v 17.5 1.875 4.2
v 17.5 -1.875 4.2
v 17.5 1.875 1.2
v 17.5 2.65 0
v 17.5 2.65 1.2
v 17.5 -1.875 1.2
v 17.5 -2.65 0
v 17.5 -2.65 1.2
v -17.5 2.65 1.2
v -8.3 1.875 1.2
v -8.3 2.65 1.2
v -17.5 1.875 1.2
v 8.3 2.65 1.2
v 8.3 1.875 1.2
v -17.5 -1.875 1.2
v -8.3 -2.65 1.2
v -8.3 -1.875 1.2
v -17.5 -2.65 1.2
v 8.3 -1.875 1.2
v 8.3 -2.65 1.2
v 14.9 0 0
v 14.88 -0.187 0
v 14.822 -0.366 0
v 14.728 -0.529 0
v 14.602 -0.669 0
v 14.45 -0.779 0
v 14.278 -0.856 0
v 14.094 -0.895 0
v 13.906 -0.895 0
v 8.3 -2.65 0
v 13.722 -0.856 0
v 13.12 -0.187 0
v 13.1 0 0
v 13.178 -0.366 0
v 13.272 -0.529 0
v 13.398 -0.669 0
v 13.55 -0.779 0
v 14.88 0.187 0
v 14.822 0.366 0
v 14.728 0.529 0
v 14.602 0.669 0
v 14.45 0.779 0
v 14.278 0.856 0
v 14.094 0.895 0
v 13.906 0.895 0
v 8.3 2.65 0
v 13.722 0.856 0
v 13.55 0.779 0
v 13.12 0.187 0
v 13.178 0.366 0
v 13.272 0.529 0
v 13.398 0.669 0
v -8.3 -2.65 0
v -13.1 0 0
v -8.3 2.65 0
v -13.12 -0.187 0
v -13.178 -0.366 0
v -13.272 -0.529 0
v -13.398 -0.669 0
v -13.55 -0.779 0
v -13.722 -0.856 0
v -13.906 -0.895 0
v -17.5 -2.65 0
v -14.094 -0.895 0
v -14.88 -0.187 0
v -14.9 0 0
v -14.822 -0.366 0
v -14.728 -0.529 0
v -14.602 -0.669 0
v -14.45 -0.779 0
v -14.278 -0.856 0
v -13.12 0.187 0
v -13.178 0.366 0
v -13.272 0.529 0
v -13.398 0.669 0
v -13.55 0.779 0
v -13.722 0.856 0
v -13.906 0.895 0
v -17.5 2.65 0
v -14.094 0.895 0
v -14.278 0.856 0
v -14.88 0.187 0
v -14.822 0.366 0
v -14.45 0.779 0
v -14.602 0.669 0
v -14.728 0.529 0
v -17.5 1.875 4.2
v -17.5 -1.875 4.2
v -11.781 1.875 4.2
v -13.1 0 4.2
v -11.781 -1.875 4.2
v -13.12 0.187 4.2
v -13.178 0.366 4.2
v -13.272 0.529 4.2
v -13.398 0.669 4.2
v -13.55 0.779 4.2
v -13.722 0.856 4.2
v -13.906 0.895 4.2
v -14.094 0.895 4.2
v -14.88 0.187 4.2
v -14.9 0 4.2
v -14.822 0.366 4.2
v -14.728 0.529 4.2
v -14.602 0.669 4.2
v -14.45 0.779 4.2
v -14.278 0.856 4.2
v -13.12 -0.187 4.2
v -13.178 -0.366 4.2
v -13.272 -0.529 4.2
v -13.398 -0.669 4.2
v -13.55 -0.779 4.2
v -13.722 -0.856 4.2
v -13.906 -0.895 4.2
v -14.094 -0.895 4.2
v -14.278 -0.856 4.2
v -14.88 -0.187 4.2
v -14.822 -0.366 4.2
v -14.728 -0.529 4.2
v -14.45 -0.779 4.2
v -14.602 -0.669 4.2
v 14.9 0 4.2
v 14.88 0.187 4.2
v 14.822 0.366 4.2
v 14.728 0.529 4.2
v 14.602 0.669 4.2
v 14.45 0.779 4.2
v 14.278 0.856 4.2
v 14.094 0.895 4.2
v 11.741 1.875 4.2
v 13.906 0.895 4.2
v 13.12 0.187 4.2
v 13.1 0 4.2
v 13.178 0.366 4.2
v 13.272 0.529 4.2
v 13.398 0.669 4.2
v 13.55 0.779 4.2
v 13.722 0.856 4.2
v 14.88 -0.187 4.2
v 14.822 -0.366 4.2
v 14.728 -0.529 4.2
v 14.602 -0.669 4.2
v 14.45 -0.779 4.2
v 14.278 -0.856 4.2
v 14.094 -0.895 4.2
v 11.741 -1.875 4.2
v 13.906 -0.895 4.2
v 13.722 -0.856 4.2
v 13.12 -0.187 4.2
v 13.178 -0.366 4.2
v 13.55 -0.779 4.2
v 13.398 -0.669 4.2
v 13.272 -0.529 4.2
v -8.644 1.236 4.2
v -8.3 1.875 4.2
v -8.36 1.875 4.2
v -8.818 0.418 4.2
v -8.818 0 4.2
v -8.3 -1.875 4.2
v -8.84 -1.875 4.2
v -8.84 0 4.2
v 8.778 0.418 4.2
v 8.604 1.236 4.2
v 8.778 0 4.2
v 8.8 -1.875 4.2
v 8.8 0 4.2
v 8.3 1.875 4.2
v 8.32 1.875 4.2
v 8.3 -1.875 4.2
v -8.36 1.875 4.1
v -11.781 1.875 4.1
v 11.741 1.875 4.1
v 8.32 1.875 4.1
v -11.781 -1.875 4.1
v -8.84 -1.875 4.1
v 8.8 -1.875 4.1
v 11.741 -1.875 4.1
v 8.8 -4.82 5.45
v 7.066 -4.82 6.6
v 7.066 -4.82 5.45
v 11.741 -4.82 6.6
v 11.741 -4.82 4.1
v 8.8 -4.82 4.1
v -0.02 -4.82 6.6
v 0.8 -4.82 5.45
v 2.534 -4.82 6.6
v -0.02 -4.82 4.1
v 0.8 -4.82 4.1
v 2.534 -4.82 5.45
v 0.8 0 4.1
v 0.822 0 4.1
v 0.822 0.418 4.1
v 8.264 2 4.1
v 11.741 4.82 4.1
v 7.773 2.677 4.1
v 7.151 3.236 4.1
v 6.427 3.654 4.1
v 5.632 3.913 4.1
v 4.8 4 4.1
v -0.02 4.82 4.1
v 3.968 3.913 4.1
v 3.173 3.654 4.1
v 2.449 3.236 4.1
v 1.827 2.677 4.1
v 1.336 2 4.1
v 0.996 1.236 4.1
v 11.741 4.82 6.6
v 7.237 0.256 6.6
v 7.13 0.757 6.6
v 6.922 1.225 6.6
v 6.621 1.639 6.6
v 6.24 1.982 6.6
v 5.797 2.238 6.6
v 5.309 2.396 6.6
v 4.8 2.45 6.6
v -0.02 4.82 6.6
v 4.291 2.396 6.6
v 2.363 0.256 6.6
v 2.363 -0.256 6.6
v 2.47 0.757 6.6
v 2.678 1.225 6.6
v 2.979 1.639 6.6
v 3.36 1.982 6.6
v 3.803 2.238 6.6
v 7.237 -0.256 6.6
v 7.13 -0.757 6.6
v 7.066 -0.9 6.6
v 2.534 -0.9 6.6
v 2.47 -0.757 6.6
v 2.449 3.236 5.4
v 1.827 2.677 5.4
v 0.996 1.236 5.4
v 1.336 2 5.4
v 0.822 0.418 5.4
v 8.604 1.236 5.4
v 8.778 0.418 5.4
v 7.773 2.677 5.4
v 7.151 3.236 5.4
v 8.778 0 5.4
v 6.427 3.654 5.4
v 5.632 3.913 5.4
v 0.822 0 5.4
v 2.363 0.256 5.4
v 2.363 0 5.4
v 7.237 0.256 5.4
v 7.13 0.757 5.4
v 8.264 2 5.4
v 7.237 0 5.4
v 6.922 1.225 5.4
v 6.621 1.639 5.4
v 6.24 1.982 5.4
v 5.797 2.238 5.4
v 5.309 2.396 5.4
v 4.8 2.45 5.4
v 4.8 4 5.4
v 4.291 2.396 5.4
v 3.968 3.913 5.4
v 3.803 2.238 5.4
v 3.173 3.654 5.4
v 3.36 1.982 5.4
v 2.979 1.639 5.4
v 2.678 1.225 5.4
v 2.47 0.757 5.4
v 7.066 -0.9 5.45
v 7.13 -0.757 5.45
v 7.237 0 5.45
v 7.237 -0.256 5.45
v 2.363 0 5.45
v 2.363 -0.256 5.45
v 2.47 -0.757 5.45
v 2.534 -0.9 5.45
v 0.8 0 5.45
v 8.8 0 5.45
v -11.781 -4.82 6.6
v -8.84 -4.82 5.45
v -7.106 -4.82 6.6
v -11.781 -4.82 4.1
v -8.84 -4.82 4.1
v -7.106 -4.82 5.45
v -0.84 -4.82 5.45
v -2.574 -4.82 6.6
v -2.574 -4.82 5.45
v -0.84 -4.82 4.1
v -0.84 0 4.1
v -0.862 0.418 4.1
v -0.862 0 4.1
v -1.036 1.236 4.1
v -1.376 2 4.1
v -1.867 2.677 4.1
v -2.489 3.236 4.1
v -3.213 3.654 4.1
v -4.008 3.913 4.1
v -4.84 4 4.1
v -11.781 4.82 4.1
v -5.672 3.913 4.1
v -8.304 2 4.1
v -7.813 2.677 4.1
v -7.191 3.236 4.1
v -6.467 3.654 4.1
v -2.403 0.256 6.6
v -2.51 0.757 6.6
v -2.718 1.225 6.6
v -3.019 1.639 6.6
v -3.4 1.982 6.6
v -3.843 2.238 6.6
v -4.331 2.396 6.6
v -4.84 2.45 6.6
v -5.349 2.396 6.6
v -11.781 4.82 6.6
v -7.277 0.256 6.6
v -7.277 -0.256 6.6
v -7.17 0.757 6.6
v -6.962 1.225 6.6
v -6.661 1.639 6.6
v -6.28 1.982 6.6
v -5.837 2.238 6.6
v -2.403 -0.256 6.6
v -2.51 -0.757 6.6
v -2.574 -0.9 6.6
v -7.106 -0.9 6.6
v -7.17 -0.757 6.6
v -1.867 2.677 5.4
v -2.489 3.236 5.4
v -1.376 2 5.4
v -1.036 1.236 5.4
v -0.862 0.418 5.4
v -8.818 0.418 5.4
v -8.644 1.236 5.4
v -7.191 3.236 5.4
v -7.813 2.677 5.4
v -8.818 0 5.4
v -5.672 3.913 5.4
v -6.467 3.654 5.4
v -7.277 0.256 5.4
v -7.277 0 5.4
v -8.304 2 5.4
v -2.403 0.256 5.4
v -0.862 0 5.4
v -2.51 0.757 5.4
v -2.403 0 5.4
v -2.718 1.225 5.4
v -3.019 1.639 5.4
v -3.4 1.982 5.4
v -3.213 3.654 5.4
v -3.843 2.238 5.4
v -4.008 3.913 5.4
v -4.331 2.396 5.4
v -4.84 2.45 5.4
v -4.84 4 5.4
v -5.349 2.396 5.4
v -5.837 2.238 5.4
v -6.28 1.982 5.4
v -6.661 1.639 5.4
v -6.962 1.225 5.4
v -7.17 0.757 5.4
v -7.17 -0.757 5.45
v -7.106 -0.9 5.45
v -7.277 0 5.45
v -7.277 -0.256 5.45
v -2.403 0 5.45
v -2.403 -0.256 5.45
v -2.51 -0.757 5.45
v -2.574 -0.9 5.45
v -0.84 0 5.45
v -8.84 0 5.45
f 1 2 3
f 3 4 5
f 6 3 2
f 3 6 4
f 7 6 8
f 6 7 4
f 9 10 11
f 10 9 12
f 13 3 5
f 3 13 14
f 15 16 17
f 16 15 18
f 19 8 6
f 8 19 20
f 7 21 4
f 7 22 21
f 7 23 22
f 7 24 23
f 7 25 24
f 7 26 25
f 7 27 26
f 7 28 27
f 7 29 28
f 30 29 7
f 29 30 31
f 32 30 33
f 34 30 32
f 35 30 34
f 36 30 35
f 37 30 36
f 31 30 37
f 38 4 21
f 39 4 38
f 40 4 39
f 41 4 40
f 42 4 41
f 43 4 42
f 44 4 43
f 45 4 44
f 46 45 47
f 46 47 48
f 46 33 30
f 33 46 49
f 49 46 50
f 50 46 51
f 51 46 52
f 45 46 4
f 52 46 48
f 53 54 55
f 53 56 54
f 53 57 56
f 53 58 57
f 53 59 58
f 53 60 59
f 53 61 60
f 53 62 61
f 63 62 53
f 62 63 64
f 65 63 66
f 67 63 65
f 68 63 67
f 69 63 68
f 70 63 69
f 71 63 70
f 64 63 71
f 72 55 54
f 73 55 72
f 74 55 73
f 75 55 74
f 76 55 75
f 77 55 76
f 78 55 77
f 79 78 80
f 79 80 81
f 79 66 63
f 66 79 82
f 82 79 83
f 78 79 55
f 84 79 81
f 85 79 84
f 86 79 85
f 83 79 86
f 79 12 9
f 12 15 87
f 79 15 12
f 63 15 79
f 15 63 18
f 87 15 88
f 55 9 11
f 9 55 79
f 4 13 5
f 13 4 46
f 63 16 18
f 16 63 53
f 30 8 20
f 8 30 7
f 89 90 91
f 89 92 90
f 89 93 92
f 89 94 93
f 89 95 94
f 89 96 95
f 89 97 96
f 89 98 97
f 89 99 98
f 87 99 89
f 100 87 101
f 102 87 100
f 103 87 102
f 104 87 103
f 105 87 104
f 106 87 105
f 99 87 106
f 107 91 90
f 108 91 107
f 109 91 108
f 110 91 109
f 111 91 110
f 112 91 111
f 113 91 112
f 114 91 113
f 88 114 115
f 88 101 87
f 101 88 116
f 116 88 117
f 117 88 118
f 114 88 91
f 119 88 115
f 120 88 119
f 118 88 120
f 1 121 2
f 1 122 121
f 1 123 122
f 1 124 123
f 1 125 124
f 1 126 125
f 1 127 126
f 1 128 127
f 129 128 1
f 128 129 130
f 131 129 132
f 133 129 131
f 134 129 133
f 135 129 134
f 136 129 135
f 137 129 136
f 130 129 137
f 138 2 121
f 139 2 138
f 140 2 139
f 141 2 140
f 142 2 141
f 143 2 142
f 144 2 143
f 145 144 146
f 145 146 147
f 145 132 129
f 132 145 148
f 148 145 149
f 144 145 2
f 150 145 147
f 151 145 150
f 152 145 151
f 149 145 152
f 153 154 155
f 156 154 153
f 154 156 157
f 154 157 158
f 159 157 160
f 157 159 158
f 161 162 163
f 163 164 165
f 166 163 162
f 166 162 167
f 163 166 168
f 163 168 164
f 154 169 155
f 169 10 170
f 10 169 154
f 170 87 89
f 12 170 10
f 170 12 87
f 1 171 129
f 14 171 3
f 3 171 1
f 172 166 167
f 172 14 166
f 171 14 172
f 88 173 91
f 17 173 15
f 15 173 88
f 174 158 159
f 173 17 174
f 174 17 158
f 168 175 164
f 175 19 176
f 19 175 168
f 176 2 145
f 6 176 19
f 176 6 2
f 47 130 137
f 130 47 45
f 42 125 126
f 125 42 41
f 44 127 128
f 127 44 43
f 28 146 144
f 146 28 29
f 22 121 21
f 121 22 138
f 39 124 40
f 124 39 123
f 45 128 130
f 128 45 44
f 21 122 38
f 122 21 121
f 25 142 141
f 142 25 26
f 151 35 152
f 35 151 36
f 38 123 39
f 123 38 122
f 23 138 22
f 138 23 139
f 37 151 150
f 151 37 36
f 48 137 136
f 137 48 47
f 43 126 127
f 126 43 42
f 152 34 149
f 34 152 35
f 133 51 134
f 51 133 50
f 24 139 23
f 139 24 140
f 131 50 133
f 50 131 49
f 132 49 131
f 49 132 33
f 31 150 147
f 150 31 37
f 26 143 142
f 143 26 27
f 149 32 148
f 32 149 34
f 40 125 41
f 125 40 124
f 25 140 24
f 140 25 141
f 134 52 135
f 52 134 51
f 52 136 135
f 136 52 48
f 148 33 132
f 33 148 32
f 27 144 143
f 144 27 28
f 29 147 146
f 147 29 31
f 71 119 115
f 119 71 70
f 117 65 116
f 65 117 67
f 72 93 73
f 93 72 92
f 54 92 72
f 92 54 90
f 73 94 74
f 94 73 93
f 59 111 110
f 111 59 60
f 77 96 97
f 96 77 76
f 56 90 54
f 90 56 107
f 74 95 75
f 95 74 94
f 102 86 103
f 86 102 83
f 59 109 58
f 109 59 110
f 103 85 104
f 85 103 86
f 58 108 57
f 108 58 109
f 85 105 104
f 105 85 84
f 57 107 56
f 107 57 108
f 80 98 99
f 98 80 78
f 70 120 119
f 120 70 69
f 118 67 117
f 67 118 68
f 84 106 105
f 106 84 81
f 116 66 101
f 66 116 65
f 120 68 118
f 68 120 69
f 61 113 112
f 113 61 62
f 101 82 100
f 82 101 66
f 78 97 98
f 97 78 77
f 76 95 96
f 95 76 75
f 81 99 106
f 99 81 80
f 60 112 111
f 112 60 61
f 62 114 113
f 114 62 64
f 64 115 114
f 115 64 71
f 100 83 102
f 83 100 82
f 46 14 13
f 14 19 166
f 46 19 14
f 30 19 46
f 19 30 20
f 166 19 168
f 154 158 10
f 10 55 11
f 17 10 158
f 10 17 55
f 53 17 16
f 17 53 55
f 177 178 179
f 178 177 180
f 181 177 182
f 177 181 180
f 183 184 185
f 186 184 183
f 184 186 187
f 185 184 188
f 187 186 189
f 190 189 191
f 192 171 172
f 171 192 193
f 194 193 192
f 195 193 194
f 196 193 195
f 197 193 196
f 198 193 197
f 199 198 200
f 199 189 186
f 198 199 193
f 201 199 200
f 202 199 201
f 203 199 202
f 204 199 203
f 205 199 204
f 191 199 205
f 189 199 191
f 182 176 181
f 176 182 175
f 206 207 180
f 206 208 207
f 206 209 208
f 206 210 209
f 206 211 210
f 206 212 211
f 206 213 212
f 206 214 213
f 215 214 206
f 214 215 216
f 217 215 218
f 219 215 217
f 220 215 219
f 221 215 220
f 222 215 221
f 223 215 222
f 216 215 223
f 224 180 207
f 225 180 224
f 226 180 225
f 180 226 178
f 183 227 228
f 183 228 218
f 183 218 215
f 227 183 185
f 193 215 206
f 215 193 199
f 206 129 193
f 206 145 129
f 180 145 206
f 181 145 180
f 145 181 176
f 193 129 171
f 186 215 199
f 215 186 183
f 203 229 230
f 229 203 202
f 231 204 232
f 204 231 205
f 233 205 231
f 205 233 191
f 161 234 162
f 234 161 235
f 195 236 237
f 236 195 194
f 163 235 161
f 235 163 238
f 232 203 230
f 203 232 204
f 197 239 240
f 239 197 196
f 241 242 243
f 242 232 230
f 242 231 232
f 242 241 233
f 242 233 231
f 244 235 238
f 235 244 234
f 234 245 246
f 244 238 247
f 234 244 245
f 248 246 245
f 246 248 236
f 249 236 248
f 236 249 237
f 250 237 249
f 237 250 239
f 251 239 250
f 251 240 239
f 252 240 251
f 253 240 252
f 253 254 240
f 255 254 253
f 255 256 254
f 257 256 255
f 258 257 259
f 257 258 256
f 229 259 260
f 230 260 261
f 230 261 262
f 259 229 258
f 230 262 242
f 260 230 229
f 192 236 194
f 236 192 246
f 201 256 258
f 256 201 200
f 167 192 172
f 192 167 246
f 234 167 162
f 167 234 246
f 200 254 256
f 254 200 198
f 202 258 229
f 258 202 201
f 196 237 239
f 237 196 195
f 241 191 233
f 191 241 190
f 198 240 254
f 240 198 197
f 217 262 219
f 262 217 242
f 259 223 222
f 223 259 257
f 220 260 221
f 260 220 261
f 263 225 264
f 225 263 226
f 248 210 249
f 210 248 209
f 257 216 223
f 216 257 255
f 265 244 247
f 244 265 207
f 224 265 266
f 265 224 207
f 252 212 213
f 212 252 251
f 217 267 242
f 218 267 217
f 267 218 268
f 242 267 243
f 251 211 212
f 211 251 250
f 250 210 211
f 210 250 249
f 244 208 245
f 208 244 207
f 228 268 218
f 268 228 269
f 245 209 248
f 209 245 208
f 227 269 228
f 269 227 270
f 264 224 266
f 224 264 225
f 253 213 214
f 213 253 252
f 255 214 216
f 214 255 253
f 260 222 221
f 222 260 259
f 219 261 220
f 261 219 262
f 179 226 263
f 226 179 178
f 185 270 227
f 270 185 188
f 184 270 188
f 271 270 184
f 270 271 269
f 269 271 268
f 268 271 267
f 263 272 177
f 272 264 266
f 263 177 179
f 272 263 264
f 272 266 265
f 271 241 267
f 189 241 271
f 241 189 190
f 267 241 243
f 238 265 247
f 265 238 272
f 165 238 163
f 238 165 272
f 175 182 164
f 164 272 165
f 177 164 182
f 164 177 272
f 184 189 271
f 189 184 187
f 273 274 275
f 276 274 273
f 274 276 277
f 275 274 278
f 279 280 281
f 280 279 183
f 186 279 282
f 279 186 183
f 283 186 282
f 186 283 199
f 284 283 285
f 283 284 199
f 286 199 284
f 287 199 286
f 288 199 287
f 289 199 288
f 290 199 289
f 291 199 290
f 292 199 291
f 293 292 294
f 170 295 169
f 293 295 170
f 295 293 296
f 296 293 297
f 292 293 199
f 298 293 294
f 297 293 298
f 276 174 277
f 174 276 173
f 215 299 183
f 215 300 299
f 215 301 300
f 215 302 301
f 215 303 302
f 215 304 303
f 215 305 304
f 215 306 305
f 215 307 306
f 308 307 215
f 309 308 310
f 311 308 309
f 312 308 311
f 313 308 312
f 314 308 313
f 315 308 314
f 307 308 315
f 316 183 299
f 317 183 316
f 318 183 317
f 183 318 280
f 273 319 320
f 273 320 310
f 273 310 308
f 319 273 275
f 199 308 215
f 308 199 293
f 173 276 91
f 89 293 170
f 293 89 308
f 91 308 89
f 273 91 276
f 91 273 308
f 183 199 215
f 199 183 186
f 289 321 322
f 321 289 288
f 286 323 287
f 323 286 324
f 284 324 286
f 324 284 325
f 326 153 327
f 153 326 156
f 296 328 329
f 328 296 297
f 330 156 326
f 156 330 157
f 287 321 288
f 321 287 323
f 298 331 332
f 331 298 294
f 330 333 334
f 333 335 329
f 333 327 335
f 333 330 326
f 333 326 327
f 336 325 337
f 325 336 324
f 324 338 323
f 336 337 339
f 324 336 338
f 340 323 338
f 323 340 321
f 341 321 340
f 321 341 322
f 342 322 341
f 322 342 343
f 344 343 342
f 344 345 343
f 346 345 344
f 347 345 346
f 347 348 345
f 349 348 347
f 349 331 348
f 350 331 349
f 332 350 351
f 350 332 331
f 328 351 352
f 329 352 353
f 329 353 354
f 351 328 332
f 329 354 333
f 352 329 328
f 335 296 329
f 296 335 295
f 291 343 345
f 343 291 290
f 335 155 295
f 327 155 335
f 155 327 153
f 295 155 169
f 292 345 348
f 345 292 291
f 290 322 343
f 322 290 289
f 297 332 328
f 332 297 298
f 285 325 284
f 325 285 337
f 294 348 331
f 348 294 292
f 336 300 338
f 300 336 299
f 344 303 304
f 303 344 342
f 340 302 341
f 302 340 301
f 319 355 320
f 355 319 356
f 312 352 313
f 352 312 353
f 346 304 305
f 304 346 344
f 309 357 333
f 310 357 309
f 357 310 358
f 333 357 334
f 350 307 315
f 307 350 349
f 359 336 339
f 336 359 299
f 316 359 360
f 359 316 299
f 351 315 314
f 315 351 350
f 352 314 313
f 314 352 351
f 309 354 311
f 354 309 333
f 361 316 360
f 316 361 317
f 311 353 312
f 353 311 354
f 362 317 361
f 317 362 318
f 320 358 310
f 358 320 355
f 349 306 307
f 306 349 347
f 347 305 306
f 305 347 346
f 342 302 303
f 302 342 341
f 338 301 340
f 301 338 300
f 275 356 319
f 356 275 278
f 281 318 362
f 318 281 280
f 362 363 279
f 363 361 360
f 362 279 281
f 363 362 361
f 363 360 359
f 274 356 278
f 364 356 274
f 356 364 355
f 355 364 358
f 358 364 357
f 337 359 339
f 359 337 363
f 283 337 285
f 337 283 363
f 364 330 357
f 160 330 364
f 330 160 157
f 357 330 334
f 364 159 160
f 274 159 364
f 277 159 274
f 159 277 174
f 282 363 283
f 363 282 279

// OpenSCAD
base_flat_h = 1.2;
base_flat_w = 5.3;
base_flat_l = 35;

base_up_h = 3;
base_up_w = 3.75;
base_up_l = 35;

inner_r = 4.9 / 2;
outer_r = 8 / 2;

fn = 30;

mount_top_lip = 1.3;
mount_top_total = 2.5;
mount_r = inner_r + 2.37;

outer_inner_rs = 14.58;

union() { 
	base();
	top();
}

module top(){
	translate ([0, 0, mount_top_total + base_up_h + base_flat_h-0.1]) {
		mirror([1,0,0])translate ([-1 * ((outer_inner_rs / 2) - inner_r-0.04), 0, 0]) top_half();
		translate ([-1 *( (outer_inner_rs / 2) - inner_r), 0, 0]) top_half();
	}
}
module top_half(){
sq = 2 * mount_r;
rotate (a = [0, 180, 90]) 
	difference(){
		union(){
			translate ([-0.5 * sq, -0.5*sq, 0]) cube (size = [sq, sq*1.22, mount_top_total]) ;
			cylinder (h = mount_top_total, r = mount_r, $fn = fn);
		}
		translate ([0, 0, mount_top_lip -0.1]) cylinder (h = mount_top_total - mount_top_lip + 1, r = outer_r, $fn = fn);
		cylinder (h = 10, r = inner_r, center = true, $fn = fn);
		translate ([5, 0, 0]) cube (size = [10, inner_r * 1.85, 10], center=true) ;
		translate ([5, 0, 1.5 * mount_top_lip-0.1]) cube (size = [10, outer_r * 2, mount_top_lip + 0.1], center=true) ;
	}
}

module base(){
gap = 16.6;
	difference() { 
		union(){
			translate([ -1/2 * base_flat_l , -1/2 * base_flat_w ,0]) cube (size = [base_flat_l, base_flat_w, base_flat_h]) ;
			translate([ -1/2 * base_up_l , -1/2 * base_up_w ,base_flat_h]) cube (size = [base_up_l, base_up_w, base_up_h]) ;
		}
			translate ([base_flat_l * 0.4,0,0])cylinder (h = 10, r = 0.9, center = true, $fn = fn);
			translate ([base_flat_l * -0.4,0,0])cylinder (h = 10, r = 0.9, center = true, $fn = fn);
			translate ([-0.5 * gap, -5, -0.01]) cube (size = [gap,  10, base_up_h + base_flat_h + 0.02]) ;
	}
}
